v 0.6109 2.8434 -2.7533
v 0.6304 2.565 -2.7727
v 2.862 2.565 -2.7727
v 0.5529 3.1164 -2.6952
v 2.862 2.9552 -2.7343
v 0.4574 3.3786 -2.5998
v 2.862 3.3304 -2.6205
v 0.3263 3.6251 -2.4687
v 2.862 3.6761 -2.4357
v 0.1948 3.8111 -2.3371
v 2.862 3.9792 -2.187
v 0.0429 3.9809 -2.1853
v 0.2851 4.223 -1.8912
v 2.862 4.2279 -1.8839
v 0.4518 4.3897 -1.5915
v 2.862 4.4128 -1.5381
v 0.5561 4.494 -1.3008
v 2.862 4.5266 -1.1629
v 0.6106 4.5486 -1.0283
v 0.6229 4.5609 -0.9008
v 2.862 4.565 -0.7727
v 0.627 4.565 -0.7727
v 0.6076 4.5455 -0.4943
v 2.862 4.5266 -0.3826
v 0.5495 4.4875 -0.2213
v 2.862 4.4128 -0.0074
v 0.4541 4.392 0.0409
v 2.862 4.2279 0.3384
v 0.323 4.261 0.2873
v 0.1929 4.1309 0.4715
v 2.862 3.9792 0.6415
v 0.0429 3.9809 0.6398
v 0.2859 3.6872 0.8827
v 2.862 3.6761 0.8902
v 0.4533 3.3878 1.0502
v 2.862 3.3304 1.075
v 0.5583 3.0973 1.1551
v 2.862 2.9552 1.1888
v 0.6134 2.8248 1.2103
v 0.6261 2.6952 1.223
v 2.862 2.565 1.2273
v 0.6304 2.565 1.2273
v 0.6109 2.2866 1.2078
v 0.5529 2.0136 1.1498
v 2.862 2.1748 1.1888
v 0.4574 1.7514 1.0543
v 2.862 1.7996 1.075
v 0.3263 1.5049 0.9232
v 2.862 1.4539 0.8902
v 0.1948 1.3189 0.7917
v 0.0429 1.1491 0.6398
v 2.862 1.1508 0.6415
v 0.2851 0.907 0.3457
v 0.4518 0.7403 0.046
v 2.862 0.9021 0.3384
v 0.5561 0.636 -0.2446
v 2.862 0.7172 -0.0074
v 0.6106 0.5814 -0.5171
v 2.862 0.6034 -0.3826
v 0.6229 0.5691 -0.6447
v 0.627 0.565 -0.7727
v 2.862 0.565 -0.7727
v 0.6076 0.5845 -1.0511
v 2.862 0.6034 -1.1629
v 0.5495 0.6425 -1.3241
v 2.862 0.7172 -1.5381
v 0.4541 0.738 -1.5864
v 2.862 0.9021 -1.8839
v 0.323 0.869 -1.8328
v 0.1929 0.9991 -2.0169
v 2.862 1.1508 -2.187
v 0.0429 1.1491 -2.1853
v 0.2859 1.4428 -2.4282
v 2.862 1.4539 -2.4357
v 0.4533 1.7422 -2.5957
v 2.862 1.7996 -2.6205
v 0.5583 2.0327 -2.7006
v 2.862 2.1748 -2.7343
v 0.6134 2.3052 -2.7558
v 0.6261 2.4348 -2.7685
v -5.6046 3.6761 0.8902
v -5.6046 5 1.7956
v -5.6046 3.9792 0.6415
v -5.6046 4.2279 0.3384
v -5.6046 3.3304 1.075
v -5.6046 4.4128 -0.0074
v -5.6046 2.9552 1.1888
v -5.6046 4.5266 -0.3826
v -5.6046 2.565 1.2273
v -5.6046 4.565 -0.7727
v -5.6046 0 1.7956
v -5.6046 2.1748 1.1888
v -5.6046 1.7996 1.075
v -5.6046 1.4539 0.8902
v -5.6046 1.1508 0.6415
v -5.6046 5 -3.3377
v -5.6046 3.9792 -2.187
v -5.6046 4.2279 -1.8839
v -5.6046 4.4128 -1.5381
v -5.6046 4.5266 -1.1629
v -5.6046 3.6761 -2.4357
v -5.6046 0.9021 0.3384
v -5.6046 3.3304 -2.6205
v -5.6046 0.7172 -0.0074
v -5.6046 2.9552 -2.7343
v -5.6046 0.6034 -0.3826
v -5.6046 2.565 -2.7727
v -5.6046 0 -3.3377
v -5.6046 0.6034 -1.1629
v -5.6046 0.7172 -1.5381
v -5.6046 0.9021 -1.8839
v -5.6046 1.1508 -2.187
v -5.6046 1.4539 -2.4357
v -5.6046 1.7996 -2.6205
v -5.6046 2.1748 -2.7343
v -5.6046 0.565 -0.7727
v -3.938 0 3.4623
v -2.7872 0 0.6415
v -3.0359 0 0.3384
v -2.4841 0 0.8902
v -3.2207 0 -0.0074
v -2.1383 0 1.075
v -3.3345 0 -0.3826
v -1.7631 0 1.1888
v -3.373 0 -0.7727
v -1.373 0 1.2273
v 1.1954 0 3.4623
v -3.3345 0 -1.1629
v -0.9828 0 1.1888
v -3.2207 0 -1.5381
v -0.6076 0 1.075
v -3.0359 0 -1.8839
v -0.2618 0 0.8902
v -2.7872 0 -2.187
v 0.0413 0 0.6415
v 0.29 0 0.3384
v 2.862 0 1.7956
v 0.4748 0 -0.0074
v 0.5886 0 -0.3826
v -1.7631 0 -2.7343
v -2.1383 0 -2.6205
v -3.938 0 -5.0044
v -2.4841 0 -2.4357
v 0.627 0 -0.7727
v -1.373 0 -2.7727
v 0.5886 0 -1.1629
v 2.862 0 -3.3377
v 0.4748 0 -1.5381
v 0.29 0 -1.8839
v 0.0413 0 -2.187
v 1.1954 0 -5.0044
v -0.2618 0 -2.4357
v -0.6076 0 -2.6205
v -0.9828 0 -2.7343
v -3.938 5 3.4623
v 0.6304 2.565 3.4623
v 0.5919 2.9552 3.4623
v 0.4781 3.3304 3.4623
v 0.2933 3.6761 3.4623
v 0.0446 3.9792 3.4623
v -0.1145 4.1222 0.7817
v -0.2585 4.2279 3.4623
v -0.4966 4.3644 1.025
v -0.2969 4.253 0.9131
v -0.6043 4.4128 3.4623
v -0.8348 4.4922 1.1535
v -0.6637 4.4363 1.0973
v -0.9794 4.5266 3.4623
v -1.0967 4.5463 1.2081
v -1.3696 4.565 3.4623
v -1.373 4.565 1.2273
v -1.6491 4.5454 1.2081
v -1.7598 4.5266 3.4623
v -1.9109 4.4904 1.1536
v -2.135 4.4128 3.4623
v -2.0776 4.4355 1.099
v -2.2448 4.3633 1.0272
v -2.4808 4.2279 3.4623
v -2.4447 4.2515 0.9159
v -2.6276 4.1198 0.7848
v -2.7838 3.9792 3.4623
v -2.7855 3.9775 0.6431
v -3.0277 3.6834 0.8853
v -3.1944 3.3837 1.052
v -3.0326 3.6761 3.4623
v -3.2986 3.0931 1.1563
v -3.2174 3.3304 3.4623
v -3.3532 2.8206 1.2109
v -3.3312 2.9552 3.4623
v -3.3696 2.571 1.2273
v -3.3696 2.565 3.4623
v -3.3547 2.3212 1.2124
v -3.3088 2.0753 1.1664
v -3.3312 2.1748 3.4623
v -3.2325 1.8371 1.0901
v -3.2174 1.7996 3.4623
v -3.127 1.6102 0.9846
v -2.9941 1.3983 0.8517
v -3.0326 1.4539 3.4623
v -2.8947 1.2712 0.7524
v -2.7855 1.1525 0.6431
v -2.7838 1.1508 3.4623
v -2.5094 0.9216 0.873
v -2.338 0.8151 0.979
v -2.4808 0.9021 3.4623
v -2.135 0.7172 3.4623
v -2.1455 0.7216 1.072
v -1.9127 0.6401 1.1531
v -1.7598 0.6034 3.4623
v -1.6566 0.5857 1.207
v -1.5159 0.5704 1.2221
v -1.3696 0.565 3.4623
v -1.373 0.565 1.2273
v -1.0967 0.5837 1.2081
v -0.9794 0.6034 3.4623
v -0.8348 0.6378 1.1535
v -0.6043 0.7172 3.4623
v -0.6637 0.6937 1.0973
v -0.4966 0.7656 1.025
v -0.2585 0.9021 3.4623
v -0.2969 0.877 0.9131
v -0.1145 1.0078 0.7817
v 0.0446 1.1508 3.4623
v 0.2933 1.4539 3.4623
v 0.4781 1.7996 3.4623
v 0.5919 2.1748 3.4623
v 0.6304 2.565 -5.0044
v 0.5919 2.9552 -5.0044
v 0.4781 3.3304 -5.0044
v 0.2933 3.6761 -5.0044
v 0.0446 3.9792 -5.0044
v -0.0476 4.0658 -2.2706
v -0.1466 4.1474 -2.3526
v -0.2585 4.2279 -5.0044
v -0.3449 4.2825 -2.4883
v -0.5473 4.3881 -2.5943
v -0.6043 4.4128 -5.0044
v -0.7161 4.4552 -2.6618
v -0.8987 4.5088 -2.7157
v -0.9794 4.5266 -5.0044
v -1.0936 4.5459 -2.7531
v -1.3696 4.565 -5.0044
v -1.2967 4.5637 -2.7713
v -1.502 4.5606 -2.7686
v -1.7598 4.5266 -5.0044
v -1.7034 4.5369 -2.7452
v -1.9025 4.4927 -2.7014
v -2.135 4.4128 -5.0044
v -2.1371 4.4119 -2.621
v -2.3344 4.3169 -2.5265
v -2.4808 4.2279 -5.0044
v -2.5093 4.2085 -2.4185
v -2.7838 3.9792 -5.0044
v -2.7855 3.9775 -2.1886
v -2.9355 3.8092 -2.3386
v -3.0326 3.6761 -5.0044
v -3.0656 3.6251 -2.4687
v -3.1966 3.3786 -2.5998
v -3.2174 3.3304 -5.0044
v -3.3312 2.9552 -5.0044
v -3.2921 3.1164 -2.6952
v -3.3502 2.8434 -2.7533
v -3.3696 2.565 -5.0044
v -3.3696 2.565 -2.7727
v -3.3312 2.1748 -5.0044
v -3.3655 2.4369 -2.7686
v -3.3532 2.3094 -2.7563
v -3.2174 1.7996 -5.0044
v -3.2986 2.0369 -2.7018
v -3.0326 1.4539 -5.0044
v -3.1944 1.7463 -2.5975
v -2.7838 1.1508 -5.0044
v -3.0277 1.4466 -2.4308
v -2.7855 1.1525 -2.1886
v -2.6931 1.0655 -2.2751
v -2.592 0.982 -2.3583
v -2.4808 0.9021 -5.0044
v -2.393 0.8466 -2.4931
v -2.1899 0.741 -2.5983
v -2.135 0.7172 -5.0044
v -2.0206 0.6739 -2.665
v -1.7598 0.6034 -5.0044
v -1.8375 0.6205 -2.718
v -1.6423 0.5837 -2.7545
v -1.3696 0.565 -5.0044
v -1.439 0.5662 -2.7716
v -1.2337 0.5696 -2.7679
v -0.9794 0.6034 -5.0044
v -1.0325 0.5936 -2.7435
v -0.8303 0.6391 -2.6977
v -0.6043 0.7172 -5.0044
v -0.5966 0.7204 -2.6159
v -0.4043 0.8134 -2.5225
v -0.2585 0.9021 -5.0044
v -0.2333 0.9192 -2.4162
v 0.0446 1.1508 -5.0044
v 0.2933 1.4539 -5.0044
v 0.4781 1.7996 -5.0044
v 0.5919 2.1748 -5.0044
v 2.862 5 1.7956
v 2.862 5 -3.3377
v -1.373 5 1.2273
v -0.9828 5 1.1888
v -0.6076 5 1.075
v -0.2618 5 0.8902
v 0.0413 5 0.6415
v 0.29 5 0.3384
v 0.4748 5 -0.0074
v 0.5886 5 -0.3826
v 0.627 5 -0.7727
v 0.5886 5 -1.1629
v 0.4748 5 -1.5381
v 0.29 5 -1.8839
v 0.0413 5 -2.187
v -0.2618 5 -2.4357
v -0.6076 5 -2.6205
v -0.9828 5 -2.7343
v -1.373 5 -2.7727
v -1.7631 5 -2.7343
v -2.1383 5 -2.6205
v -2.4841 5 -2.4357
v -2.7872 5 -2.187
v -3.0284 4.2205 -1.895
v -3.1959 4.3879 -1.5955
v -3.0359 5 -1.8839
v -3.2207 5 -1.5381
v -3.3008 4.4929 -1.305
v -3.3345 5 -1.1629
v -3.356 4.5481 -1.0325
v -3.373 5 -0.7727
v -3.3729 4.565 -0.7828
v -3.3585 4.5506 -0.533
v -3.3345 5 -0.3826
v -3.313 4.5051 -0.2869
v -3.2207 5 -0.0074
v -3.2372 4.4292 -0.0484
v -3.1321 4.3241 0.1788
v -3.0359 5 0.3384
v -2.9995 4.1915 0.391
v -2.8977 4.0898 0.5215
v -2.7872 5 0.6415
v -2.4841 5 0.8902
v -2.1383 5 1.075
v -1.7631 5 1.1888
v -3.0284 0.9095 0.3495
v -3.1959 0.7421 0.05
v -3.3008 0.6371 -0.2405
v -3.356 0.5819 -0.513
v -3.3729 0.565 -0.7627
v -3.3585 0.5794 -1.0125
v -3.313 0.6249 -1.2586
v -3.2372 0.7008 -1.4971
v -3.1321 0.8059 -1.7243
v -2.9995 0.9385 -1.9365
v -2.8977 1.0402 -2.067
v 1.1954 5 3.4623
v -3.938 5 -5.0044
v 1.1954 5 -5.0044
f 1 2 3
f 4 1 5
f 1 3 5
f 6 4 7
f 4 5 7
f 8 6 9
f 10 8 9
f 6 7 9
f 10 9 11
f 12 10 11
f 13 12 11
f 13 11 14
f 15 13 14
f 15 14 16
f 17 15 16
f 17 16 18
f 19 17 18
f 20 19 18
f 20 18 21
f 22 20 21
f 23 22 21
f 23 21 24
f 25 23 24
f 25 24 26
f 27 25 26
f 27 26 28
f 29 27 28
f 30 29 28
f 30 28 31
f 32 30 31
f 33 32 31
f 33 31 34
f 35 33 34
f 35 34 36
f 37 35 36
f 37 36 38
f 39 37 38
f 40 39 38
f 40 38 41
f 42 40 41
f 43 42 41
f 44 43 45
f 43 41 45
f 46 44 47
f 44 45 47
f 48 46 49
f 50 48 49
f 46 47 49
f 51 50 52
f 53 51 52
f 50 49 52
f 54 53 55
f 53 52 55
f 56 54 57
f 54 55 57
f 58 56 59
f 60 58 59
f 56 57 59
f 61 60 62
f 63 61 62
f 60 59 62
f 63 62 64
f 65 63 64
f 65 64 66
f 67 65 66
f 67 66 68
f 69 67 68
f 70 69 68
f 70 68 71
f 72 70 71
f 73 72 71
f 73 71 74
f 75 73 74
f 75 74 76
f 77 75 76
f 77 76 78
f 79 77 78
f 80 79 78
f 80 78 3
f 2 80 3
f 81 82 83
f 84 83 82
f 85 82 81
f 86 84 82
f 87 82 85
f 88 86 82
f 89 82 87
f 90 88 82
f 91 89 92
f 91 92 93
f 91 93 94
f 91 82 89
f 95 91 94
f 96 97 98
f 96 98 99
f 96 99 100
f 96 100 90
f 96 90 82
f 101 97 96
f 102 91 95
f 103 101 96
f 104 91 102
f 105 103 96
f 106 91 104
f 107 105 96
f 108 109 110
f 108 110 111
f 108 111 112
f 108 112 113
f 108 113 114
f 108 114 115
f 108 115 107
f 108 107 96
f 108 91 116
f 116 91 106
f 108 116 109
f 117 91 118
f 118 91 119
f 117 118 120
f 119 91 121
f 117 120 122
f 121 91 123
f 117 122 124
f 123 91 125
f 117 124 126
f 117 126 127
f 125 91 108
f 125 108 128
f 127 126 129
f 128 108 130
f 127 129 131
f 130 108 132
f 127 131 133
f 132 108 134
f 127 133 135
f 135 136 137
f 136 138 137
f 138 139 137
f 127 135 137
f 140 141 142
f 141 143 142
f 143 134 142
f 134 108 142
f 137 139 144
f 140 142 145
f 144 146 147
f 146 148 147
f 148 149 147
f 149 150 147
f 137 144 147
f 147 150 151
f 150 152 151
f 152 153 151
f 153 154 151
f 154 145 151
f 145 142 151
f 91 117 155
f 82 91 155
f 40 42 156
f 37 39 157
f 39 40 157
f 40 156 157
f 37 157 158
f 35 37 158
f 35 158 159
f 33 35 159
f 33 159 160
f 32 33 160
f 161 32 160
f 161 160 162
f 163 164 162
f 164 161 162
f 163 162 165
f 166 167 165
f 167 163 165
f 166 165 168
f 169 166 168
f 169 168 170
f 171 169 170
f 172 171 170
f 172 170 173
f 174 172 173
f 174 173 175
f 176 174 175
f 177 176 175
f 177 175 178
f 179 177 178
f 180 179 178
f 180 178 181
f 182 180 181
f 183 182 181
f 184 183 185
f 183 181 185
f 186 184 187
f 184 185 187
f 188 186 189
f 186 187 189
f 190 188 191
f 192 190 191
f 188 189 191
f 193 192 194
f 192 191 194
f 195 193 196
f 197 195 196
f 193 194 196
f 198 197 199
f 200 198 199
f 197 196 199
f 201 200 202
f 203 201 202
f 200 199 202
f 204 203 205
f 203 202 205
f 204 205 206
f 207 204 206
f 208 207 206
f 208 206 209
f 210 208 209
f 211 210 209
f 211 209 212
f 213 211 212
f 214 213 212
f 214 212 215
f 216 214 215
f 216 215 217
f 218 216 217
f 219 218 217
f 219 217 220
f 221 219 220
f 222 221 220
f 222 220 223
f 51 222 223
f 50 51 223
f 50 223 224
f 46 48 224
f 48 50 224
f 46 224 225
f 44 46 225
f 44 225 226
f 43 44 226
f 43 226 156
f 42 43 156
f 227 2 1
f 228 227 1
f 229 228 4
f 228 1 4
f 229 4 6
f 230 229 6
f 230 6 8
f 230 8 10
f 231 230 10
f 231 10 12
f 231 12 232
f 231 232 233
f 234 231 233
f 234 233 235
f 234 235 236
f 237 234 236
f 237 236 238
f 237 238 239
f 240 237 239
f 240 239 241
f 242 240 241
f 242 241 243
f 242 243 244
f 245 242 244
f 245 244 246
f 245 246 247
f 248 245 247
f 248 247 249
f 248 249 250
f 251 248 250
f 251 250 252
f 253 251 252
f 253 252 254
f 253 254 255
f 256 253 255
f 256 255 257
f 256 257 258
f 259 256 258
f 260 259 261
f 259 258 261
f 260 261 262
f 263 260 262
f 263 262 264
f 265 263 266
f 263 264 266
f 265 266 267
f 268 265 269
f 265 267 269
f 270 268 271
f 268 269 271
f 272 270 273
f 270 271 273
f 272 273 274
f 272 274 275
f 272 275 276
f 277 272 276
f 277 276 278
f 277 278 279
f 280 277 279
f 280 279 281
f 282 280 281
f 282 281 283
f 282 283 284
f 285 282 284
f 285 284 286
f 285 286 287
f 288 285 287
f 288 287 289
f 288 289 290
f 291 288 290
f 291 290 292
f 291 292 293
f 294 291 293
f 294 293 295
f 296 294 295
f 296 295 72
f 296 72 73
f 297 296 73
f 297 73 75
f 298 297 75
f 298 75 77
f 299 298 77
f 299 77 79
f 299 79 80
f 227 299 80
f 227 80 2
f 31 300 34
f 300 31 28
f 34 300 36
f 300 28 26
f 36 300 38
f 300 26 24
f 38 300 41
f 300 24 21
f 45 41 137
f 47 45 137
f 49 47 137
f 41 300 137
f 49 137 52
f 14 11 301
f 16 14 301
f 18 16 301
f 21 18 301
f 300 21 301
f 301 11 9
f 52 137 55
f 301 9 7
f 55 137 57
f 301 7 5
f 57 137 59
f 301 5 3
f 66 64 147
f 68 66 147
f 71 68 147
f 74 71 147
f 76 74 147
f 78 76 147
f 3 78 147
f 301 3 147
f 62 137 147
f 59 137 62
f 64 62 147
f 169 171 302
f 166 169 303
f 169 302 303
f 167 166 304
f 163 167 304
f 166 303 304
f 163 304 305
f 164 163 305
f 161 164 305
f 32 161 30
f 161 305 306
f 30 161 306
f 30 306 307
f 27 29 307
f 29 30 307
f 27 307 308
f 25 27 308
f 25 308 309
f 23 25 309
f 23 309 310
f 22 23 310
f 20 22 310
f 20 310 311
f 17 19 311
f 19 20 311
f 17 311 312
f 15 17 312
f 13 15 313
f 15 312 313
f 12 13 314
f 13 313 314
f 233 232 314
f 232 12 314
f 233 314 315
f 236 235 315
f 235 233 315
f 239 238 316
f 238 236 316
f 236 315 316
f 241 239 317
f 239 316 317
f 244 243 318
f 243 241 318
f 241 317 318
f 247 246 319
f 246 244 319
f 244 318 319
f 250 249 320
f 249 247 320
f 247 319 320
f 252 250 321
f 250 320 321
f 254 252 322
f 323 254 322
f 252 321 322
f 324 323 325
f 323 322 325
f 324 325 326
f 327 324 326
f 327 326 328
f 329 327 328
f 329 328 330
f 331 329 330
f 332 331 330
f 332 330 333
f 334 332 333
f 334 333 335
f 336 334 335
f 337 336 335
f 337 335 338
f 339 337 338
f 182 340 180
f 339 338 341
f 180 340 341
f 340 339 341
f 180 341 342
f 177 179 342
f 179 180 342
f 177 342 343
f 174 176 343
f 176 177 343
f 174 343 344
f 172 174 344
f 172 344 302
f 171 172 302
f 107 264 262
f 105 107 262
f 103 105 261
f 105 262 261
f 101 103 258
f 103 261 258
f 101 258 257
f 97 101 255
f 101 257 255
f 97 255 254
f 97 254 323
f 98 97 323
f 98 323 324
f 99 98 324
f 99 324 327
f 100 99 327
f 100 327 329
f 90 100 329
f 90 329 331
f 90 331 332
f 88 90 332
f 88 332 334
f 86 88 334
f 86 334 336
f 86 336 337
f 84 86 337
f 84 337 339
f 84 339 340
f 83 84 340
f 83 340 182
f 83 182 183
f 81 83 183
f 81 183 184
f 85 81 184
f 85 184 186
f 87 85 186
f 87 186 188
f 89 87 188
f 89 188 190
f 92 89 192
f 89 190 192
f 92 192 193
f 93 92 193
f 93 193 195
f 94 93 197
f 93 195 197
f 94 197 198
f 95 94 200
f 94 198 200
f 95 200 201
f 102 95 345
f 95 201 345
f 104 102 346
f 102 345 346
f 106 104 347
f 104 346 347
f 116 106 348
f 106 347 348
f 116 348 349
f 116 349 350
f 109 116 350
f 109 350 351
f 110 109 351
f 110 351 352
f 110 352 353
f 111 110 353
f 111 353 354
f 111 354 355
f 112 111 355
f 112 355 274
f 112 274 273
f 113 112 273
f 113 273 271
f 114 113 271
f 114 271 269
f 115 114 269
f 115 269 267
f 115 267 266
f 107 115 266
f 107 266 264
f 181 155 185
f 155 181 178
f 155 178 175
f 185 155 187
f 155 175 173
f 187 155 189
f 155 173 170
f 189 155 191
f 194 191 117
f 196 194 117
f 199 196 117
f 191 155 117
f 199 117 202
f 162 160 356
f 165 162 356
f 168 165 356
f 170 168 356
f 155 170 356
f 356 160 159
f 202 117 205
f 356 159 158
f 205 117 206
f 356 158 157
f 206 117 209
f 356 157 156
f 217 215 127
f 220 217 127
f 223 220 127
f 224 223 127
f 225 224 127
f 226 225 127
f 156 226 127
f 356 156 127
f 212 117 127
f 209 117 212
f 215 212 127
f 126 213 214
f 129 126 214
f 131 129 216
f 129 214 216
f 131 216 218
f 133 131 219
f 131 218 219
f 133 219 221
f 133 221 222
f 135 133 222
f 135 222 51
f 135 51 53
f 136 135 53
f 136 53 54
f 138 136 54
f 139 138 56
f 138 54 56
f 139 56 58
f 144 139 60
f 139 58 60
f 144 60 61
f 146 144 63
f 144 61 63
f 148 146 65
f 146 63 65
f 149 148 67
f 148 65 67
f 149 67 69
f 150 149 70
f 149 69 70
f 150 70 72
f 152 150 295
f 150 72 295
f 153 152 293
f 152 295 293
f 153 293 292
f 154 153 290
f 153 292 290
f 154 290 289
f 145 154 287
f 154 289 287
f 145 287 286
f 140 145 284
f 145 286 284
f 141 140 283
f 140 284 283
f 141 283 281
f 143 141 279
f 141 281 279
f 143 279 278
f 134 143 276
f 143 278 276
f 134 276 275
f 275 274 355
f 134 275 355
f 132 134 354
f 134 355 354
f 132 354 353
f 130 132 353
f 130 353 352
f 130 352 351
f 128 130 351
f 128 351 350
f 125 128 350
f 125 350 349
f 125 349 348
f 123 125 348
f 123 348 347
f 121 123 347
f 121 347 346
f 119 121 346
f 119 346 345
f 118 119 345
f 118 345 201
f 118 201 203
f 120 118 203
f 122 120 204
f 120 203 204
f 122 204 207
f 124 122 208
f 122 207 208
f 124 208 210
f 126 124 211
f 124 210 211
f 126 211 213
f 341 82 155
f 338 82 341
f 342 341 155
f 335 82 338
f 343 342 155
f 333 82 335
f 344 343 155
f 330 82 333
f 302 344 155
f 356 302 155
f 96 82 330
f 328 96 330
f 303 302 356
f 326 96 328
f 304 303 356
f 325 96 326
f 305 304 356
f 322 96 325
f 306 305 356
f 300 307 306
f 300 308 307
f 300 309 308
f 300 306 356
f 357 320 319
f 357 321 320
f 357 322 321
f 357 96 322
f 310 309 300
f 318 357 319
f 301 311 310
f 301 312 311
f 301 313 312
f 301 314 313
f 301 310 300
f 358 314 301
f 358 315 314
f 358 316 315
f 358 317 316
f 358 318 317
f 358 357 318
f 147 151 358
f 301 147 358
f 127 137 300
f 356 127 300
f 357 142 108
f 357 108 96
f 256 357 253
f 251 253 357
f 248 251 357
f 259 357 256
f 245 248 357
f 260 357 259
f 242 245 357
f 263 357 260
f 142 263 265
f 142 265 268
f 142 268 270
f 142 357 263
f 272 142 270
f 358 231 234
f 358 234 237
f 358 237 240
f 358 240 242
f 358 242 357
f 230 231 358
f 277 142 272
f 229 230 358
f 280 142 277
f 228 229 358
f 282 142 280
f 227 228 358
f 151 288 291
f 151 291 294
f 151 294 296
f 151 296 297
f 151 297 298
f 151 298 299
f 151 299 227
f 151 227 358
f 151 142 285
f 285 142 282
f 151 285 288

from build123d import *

# Parameters (mm, degrees)
SKETCH1_W           = 8.466666666
SKETCH1_H           = 8.466666667
BOSS_EXTRUDE1_DEPTH = 5
CHAMFER1_SIZE       = 1.666666667
SKETCH2_R           = 2
CUT_EXTRUDE1_DEPTH  = 10
SKETCH3_R           = 2
CUT_EXTRUDE2_DEPTH  = 12.317961286
SKETCH4_R           = 2
CUT_EXTRUDE3_DEPTH  = 10


with BuildPart() as part:
    # Sketch1 → Boss-Extrude1 (new body)
    with BuildSketch(Plane(origin=(0, 0, 0), x_dir=(1, 0, 0), z_dir=(0, 1, 0))):
        with Locations((-1.371290047, 0.771071428)):
            Rectangle(SKETCH1_W, SKETCH1_H)
    extrude(amount=BOSS_EXTRUDE1_DEPTH)

    # Chamfer1
    chamfer1_edges = [part.edges().sort_by_distance(p)[0] for p in [
        (2.862043286, 2.5, 3.462261905),
        (-5.60462338, 2.5, 3.462261905),
        (-5.60462338, 2.5, -5.004404762),
        (2.862043286, 2.5, -5.004404762),
    ]]
    chamfer(chamfer1_edges, length=CHAMFER1_SIZE)

    # Sketch2 → Cut-Extrude1 (cut)
    with BuildSketch(Plane(origin=(2.862043286, 0, 0), x_dir=(0, 0, -1), z_dir=(1, 0, 0))):
        with Locations((0.772738095, 2.565)):
            Circle(SKETCH2_R)
    extrude(amount=-CUT_EXTRUDE1_DEPTH, mode=Mode.SUBTRACT)

    # Sketch3 → Cut-Extrude2 (cut, through all)
    with BuildSketch(Plane.XY.offset(3.462261905)):
        with Locations((-1.36962338, 2.565)):
            Circle(SKETCH3_R)
    extrude(amount=-CUT_EXTRUDE2_DEPTH, mode=Mode.SUBTRACT)

    # Sketch4 → Cut-Extrude3 (cut)
    with BuildSketch(Plane(origin=(0, 5, 0), x_dir=(1, 0, 0), z_dir=(0, 1, 0))):
        with Locations(Location((-1.372956714, 0.772738095, 0), (0, 0, 270))):
            Circle(SKETCH4_R)
    extrude(amount=-CUT_EXTRUDE3_DEPTH, mode=Mode.SUBTRACT)


solid = part.part
